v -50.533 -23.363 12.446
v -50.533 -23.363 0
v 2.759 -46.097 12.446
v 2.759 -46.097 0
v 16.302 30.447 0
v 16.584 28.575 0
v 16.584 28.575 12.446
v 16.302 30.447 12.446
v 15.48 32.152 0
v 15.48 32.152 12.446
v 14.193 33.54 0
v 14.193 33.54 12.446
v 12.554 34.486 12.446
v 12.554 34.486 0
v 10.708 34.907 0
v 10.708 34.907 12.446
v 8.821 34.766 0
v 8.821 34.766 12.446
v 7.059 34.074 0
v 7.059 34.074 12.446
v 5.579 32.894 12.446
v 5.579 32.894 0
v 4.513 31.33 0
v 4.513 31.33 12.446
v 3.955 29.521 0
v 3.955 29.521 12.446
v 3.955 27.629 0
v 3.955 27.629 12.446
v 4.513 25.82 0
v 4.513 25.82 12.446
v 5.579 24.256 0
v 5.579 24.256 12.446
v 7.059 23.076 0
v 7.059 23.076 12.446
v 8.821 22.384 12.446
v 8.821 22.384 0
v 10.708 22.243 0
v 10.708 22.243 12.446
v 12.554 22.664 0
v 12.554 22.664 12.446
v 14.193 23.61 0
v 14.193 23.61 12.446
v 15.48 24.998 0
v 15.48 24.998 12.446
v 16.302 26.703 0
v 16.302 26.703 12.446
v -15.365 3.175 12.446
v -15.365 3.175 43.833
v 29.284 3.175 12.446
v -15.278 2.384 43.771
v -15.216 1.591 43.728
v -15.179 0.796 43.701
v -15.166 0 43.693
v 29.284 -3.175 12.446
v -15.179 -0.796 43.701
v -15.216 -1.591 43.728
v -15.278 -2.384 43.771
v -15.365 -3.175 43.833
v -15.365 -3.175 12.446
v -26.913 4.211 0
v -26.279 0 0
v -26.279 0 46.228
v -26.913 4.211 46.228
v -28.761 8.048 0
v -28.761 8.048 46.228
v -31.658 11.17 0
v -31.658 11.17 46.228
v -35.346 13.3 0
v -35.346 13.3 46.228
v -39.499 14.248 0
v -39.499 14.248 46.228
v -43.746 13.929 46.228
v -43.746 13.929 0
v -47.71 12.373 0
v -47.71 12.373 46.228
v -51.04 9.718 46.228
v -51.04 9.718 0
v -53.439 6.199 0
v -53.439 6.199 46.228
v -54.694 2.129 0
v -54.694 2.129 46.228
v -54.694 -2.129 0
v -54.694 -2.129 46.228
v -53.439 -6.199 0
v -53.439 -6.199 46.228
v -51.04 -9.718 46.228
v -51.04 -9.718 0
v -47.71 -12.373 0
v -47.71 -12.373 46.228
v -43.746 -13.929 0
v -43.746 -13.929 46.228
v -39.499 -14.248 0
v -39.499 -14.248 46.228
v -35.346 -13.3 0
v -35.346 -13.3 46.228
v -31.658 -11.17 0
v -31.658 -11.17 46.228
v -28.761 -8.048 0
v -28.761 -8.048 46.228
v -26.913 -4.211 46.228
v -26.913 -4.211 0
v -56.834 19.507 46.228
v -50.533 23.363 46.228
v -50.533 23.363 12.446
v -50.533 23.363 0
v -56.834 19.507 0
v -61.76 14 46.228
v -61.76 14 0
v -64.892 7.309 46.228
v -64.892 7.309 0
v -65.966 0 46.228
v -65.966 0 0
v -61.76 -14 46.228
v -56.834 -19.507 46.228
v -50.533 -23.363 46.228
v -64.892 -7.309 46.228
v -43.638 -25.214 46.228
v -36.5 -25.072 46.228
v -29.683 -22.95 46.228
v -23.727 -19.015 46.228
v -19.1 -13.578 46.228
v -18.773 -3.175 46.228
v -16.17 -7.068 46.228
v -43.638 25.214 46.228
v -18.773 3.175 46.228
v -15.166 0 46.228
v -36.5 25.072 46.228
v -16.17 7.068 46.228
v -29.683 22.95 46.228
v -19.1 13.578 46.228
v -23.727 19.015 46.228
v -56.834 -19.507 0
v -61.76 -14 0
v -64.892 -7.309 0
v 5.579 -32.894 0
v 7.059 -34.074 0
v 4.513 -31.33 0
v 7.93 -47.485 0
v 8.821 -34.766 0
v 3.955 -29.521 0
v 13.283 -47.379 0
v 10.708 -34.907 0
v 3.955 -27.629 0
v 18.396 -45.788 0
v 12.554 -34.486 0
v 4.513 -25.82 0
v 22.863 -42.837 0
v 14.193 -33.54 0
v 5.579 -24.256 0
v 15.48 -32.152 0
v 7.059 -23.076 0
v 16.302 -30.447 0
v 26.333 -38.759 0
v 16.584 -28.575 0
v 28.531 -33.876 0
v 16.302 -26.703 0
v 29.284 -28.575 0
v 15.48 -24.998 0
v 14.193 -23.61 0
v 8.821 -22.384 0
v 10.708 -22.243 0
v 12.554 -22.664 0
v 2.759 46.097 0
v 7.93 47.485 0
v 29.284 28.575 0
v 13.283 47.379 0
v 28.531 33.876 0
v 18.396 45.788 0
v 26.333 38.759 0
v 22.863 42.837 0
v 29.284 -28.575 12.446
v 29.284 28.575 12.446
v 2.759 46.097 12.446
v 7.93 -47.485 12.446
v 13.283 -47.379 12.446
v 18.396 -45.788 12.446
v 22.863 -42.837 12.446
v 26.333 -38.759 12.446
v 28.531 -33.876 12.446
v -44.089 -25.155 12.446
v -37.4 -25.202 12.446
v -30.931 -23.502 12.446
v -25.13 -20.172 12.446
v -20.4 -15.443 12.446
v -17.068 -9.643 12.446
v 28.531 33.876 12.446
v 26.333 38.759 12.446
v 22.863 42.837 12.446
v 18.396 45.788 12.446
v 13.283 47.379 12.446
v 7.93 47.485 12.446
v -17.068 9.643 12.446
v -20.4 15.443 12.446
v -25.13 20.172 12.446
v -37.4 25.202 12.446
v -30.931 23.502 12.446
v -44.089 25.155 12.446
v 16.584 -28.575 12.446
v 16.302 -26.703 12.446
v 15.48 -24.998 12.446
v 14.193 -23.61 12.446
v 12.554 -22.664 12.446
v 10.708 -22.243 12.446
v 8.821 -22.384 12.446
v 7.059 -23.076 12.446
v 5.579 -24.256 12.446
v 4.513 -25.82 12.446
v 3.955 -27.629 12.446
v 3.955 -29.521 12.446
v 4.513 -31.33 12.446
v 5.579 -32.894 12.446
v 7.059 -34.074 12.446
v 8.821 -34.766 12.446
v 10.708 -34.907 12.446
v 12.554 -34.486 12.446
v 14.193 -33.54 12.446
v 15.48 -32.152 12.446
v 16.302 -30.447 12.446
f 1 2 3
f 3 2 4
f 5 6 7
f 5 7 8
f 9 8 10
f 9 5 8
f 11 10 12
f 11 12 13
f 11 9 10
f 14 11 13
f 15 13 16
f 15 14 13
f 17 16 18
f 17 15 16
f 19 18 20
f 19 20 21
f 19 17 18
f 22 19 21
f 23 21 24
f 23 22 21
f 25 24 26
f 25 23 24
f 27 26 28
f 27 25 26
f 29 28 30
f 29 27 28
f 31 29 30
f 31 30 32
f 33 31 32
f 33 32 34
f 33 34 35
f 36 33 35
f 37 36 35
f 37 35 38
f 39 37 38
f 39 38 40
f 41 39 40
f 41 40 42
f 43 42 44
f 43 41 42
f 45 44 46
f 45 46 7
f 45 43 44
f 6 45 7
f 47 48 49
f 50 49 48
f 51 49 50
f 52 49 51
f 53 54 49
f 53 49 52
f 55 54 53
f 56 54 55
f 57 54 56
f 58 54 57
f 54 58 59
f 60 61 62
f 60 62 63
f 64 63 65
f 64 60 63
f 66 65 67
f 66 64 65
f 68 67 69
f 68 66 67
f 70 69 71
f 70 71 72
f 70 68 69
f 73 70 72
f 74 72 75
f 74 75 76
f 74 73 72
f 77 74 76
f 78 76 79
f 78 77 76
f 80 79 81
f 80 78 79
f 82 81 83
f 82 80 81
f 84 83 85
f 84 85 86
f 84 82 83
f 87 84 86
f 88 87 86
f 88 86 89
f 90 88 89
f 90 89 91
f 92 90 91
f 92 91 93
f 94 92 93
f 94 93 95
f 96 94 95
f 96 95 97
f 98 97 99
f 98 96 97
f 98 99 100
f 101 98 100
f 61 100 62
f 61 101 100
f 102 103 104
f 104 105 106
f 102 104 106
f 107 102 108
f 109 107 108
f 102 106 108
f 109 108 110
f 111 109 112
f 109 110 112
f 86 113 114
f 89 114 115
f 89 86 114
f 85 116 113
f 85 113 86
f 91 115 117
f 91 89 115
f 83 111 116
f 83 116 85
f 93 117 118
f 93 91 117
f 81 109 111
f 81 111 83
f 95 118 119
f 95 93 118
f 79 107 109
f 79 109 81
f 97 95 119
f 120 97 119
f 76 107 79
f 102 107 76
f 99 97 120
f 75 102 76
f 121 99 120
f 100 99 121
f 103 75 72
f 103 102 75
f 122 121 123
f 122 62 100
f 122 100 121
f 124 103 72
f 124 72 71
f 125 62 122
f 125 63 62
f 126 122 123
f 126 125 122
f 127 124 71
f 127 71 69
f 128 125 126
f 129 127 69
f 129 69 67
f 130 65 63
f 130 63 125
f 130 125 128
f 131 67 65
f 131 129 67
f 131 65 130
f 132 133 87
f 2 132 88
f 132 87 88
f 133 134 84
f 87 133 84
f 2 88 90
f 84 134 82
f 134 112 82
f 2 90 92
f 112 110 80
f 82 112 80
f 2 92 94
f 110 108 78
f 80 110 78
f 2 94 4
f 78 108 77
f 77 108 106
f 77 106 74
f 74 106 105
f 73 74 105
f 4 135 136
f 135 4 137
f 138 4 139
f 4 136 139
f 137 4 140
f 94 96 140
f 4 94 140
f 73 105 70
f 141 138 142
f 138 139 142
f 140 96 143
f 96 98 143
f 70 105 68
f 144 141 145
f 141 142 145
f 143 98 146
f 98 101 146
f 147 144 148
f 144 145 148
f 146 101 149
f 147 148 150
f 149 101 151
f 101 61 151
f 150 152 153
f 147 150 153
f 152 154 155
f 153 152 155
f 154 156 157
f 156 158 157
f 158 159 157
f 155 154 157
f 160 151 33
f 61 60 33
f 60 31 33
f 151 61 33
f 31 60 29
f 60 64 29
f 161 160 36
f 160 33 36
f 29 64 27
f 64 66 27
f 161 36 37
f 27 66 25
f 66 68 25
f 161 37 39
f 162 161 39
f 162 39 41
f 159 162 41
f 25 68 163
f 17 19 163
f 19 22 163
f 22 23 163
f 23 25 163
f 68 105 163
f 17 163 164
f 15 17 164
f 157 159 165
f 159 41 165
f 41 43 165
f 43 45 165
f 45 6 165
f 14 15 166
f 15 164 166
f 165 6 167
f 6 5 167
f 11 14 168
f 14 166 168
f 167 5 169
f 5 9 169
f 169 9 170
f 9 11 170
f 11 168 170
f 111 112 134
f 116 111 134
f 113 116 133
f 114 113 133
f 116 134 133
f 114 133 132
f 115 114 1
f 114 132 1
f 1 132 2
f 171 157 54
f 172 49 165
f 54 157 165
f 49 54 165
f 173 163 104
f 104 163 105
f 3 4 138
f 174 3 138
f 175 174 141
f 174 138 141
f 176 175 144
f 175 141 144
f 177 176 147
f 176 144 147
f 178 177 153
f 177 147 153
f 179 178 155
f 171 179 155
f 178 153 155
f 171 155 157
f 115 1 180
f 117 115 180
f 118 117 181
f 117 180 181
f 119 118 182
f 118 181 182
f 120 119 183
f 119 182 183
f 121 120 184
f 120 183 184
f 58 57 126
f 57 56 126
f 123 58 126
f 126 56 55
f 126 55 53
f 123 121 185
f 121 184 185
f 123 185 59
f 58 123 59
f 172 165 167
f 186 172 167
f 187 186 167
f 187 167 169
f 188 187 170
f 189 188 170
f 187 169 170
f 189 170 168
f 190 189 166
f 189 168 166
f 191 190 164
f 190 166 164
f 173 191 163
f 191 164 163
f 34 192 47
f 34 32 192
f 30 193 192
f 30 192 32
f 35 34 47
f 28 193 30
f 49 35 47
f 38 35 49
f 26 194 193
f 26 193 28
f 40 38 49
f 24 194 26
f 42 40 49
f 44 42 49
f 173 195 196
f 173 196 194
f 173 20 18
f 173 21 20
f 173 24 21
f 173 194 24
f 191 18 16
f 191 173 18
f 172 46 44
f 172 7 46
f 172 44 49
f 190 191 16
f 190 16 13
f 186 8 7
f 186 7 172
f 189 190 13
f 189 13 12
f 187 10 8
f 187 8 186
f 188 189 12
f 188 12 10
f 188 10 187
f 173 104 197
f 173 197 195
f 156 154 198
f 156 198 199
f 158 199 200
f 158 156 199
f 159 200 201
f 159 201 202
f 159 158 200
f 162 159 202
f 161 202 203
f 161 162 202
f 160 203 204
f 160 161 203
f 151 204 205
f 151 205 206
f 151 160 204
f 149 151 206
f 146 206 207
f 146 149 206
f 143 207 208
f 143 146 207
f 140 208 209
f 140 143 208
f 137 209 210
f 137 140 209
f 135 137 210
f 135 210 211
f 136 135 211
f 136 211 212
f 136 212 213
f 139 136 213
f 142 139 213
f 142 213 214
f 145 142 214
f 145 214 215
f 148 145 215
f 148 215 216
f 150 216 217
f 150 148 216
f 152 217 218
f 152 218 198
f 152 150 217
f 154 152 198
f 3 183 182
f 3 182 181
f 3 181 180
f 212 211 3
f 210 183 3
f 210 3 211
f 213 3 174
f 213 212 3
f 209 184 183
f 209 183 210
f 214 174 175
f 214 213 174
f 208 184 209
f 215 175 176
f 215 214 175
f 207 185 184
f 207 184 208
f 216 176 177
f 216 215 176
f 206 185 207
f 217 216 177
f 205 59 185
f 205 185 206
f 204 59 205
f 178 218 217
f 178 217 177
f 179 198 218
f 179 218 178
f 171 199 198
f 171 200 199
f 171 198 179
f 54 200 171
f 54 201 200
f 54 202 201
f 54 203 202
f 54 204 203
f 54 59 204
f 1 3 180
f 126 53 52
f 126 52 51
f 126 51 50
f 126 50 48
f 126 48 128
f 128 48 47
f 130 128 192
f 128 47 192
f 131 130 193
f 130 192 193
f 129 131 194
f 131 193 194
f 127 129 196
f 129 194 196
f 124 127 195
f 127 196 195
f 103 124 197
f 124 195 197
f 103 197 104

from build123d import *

# Parameters (mm, degrees)
F0_R     = 14.2875
F1_DEPTH = 46.228
F0_R_2   = 6.35
F2_DEPTH = 12.446
F4_DEPTH = 3.175


with BuildPart() as f1:
    # F0 (on Top) → F1 (new body)
    with BuildSketch(Plane.XY):
        with BuildLine():
            ThreePointArc((-15.166243, 0), (-26.566113, 21.193309), (-50.532885, 23.36292))
            ThreePointArc((-50.532885, 23.36292), (-61.759552, 14.00013), (-65.966243, 0))
            ThreePointArc((-65.966243, 0), (-61.759552, -14.00013), (-50.532885, -23.36292))
            ThreePointArc((-50.532885, -23.36292), (-26.566113, -21.193309), (-15.166243, 0))
        make_face()
        with Locations((-40.566243, 0)):
            Circle(F0_R, mode=Mode.SUBTRACT)
    extrude(amount=F1_DEPTH)

    # F0 (on Top) → F2 (join)
    with BuildSketch(Plane.XY):
        with BuildLine():
            Line((29.283757, 0), (29.283757, 28.575))
            ThreePointArc((29.283757, 28.575), (20.733855, 44.469982), (2.758775, 46.09719))
            Line((2.758775, 46.09719), (-50.532885, 23.36292))
            ThreePointArc((-50.532885, 23.36292), (-26.566113, 21.193309), (-15.166243, 0))
            ThreePointArc((-15.166243, 0), (-26.566113, -21.193309), (-50.532885, -23.36292))
            Line((-50.532885, -23.36292), (2.758775, -46.09719))
            ThreePointArc((2.758775, -46.09719), (20.733855, -44.469982), (29.283757, -28.575))
            Line((29.283757, -28.575), (29.283757, 0))
        make_face()
        with Locations((10.233757, -28.575)):
            Circle(F0_R_2, mode=Mode.SUBTRACT)
        with Locations((10.233757, 28.575)):
            Circle(F0_R_2, mode=Mode.SUBTRACT)
    extrude(amount=F2_DEPTH)

    # F3 (on Front) → F4 (join, symmetric)
    with BuildSketch(Plane.XZ):
        Polygon((29.283757, 12.446), (-18.772896, 46.228), (-18.772896, 12.446), align=None)
    extrude(amount=F4_DEPTH, both=True)


solid = f1.part
